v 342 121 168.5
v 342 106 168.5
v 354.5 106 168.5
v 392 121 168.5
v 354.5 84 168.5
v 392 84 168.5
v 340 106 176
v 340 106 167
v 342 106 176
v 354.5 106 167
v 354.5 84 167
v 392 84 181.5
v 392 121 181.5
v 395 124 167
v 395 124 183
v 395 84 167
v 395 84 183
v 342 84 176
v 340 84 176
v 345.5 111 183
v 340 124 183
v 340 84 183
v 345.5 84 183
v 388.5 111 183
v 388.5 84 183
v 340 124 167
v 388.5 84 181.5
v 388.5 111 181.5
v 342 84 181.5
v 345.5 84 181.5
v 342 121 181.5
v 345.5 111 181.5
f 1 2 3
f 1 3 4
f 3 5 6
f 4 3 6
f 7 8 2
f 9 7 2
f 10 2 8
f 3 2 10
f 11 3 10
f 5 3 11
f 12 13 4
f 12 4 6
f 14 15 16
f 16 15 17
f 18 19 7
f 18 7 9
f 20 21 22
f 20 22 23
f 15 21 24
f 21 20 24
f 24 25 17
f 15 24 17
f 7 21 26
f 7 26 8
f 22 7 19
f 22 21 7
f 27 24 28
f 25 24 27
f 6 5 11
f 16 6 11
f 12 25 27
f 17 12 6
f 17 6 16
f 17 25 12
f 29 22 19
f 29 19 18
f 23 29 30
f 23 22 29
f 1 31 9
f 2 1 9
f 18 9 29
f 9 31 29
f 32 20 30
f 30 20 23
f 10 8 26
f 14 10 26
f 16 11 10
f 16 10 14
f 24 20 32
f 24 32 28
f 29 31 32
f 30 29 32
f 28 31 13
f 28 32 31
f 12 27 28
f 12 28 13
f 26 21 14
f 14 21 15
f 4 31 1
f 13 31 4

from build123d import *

# Parameters (mm, degrees)
BOX138_W     = 17
BOX138_H     = 24
BOX138_DEPTH = 11
BOX137_W     = 43
BOX137_H     = 27
BOX137_DEPTH = 11
BOX136_W     = 50
BOX136_H     = 37
BOX136_DEPTH = 13
BOX135_W     = 55
BOX135_H     = 40
BOX135_DEPTH = 16


with BuildPart() as cube060:
    # Box138 → Box138 (new body)
    with BuildSketch(Plane(origin=(337.5, 106, 176), x_dir=(1, 0, 0), z_dir=(0, 0, -1))):
        with Locations((8.5, 12)):
            Rectangle(BOX138_W, BOX138_H)
    extrude(amount=BOX138_DEPTH)


with BuildPart() as cube059:
    # Box137 → Box137 (new body)
    with BuildSketch(Plane(origin=(345.5, 111, 185), x_dir=(1, 0, 0), z_dir=(0, 0, -1))):
        with Locations((21.5, 13.5)):
            Rectangle(BOX137_W, BOX137_H)
    extrude(amount=BOX137_DEPTH)


with BuildPart() as cube058:
    # Box136 → Box136 (new body)
    with BuildSketch(Plane(origin=(342, 121, 181.5), x_dir=(1, 0, 0), z_dir=(0, 0, -1))):
        with Locations((25, 18.5)):
            Rectangle(BOX136_W, BOX136_H)
    extrude(amount=BOX136_DEPTH)


with BuildPart() as cut026:
    # Box135 → Box135 (new body)
    with BuildSketch(Plane(origin=(340, 124, 183), x_dir=(1, 0, 0), z_dir=(0, 0, -1))):
        with Locations((27.5, 20)):
            Rectangle(BOX135_W, BOX135_H)
    extrude(amount=BOX135_DEPTH)

    # Cut024: cut Cube058
    add(cube058.part, mode=Mode.SUBTRACT)

    # Cut025: cut Cube059
    add(cube059.part, mode=Mode.SUBTRACT)

    # Cut026: cut Cube060
    add(cube060.part, mode=Mode.SUBTRACT)


solid = cut026.part
